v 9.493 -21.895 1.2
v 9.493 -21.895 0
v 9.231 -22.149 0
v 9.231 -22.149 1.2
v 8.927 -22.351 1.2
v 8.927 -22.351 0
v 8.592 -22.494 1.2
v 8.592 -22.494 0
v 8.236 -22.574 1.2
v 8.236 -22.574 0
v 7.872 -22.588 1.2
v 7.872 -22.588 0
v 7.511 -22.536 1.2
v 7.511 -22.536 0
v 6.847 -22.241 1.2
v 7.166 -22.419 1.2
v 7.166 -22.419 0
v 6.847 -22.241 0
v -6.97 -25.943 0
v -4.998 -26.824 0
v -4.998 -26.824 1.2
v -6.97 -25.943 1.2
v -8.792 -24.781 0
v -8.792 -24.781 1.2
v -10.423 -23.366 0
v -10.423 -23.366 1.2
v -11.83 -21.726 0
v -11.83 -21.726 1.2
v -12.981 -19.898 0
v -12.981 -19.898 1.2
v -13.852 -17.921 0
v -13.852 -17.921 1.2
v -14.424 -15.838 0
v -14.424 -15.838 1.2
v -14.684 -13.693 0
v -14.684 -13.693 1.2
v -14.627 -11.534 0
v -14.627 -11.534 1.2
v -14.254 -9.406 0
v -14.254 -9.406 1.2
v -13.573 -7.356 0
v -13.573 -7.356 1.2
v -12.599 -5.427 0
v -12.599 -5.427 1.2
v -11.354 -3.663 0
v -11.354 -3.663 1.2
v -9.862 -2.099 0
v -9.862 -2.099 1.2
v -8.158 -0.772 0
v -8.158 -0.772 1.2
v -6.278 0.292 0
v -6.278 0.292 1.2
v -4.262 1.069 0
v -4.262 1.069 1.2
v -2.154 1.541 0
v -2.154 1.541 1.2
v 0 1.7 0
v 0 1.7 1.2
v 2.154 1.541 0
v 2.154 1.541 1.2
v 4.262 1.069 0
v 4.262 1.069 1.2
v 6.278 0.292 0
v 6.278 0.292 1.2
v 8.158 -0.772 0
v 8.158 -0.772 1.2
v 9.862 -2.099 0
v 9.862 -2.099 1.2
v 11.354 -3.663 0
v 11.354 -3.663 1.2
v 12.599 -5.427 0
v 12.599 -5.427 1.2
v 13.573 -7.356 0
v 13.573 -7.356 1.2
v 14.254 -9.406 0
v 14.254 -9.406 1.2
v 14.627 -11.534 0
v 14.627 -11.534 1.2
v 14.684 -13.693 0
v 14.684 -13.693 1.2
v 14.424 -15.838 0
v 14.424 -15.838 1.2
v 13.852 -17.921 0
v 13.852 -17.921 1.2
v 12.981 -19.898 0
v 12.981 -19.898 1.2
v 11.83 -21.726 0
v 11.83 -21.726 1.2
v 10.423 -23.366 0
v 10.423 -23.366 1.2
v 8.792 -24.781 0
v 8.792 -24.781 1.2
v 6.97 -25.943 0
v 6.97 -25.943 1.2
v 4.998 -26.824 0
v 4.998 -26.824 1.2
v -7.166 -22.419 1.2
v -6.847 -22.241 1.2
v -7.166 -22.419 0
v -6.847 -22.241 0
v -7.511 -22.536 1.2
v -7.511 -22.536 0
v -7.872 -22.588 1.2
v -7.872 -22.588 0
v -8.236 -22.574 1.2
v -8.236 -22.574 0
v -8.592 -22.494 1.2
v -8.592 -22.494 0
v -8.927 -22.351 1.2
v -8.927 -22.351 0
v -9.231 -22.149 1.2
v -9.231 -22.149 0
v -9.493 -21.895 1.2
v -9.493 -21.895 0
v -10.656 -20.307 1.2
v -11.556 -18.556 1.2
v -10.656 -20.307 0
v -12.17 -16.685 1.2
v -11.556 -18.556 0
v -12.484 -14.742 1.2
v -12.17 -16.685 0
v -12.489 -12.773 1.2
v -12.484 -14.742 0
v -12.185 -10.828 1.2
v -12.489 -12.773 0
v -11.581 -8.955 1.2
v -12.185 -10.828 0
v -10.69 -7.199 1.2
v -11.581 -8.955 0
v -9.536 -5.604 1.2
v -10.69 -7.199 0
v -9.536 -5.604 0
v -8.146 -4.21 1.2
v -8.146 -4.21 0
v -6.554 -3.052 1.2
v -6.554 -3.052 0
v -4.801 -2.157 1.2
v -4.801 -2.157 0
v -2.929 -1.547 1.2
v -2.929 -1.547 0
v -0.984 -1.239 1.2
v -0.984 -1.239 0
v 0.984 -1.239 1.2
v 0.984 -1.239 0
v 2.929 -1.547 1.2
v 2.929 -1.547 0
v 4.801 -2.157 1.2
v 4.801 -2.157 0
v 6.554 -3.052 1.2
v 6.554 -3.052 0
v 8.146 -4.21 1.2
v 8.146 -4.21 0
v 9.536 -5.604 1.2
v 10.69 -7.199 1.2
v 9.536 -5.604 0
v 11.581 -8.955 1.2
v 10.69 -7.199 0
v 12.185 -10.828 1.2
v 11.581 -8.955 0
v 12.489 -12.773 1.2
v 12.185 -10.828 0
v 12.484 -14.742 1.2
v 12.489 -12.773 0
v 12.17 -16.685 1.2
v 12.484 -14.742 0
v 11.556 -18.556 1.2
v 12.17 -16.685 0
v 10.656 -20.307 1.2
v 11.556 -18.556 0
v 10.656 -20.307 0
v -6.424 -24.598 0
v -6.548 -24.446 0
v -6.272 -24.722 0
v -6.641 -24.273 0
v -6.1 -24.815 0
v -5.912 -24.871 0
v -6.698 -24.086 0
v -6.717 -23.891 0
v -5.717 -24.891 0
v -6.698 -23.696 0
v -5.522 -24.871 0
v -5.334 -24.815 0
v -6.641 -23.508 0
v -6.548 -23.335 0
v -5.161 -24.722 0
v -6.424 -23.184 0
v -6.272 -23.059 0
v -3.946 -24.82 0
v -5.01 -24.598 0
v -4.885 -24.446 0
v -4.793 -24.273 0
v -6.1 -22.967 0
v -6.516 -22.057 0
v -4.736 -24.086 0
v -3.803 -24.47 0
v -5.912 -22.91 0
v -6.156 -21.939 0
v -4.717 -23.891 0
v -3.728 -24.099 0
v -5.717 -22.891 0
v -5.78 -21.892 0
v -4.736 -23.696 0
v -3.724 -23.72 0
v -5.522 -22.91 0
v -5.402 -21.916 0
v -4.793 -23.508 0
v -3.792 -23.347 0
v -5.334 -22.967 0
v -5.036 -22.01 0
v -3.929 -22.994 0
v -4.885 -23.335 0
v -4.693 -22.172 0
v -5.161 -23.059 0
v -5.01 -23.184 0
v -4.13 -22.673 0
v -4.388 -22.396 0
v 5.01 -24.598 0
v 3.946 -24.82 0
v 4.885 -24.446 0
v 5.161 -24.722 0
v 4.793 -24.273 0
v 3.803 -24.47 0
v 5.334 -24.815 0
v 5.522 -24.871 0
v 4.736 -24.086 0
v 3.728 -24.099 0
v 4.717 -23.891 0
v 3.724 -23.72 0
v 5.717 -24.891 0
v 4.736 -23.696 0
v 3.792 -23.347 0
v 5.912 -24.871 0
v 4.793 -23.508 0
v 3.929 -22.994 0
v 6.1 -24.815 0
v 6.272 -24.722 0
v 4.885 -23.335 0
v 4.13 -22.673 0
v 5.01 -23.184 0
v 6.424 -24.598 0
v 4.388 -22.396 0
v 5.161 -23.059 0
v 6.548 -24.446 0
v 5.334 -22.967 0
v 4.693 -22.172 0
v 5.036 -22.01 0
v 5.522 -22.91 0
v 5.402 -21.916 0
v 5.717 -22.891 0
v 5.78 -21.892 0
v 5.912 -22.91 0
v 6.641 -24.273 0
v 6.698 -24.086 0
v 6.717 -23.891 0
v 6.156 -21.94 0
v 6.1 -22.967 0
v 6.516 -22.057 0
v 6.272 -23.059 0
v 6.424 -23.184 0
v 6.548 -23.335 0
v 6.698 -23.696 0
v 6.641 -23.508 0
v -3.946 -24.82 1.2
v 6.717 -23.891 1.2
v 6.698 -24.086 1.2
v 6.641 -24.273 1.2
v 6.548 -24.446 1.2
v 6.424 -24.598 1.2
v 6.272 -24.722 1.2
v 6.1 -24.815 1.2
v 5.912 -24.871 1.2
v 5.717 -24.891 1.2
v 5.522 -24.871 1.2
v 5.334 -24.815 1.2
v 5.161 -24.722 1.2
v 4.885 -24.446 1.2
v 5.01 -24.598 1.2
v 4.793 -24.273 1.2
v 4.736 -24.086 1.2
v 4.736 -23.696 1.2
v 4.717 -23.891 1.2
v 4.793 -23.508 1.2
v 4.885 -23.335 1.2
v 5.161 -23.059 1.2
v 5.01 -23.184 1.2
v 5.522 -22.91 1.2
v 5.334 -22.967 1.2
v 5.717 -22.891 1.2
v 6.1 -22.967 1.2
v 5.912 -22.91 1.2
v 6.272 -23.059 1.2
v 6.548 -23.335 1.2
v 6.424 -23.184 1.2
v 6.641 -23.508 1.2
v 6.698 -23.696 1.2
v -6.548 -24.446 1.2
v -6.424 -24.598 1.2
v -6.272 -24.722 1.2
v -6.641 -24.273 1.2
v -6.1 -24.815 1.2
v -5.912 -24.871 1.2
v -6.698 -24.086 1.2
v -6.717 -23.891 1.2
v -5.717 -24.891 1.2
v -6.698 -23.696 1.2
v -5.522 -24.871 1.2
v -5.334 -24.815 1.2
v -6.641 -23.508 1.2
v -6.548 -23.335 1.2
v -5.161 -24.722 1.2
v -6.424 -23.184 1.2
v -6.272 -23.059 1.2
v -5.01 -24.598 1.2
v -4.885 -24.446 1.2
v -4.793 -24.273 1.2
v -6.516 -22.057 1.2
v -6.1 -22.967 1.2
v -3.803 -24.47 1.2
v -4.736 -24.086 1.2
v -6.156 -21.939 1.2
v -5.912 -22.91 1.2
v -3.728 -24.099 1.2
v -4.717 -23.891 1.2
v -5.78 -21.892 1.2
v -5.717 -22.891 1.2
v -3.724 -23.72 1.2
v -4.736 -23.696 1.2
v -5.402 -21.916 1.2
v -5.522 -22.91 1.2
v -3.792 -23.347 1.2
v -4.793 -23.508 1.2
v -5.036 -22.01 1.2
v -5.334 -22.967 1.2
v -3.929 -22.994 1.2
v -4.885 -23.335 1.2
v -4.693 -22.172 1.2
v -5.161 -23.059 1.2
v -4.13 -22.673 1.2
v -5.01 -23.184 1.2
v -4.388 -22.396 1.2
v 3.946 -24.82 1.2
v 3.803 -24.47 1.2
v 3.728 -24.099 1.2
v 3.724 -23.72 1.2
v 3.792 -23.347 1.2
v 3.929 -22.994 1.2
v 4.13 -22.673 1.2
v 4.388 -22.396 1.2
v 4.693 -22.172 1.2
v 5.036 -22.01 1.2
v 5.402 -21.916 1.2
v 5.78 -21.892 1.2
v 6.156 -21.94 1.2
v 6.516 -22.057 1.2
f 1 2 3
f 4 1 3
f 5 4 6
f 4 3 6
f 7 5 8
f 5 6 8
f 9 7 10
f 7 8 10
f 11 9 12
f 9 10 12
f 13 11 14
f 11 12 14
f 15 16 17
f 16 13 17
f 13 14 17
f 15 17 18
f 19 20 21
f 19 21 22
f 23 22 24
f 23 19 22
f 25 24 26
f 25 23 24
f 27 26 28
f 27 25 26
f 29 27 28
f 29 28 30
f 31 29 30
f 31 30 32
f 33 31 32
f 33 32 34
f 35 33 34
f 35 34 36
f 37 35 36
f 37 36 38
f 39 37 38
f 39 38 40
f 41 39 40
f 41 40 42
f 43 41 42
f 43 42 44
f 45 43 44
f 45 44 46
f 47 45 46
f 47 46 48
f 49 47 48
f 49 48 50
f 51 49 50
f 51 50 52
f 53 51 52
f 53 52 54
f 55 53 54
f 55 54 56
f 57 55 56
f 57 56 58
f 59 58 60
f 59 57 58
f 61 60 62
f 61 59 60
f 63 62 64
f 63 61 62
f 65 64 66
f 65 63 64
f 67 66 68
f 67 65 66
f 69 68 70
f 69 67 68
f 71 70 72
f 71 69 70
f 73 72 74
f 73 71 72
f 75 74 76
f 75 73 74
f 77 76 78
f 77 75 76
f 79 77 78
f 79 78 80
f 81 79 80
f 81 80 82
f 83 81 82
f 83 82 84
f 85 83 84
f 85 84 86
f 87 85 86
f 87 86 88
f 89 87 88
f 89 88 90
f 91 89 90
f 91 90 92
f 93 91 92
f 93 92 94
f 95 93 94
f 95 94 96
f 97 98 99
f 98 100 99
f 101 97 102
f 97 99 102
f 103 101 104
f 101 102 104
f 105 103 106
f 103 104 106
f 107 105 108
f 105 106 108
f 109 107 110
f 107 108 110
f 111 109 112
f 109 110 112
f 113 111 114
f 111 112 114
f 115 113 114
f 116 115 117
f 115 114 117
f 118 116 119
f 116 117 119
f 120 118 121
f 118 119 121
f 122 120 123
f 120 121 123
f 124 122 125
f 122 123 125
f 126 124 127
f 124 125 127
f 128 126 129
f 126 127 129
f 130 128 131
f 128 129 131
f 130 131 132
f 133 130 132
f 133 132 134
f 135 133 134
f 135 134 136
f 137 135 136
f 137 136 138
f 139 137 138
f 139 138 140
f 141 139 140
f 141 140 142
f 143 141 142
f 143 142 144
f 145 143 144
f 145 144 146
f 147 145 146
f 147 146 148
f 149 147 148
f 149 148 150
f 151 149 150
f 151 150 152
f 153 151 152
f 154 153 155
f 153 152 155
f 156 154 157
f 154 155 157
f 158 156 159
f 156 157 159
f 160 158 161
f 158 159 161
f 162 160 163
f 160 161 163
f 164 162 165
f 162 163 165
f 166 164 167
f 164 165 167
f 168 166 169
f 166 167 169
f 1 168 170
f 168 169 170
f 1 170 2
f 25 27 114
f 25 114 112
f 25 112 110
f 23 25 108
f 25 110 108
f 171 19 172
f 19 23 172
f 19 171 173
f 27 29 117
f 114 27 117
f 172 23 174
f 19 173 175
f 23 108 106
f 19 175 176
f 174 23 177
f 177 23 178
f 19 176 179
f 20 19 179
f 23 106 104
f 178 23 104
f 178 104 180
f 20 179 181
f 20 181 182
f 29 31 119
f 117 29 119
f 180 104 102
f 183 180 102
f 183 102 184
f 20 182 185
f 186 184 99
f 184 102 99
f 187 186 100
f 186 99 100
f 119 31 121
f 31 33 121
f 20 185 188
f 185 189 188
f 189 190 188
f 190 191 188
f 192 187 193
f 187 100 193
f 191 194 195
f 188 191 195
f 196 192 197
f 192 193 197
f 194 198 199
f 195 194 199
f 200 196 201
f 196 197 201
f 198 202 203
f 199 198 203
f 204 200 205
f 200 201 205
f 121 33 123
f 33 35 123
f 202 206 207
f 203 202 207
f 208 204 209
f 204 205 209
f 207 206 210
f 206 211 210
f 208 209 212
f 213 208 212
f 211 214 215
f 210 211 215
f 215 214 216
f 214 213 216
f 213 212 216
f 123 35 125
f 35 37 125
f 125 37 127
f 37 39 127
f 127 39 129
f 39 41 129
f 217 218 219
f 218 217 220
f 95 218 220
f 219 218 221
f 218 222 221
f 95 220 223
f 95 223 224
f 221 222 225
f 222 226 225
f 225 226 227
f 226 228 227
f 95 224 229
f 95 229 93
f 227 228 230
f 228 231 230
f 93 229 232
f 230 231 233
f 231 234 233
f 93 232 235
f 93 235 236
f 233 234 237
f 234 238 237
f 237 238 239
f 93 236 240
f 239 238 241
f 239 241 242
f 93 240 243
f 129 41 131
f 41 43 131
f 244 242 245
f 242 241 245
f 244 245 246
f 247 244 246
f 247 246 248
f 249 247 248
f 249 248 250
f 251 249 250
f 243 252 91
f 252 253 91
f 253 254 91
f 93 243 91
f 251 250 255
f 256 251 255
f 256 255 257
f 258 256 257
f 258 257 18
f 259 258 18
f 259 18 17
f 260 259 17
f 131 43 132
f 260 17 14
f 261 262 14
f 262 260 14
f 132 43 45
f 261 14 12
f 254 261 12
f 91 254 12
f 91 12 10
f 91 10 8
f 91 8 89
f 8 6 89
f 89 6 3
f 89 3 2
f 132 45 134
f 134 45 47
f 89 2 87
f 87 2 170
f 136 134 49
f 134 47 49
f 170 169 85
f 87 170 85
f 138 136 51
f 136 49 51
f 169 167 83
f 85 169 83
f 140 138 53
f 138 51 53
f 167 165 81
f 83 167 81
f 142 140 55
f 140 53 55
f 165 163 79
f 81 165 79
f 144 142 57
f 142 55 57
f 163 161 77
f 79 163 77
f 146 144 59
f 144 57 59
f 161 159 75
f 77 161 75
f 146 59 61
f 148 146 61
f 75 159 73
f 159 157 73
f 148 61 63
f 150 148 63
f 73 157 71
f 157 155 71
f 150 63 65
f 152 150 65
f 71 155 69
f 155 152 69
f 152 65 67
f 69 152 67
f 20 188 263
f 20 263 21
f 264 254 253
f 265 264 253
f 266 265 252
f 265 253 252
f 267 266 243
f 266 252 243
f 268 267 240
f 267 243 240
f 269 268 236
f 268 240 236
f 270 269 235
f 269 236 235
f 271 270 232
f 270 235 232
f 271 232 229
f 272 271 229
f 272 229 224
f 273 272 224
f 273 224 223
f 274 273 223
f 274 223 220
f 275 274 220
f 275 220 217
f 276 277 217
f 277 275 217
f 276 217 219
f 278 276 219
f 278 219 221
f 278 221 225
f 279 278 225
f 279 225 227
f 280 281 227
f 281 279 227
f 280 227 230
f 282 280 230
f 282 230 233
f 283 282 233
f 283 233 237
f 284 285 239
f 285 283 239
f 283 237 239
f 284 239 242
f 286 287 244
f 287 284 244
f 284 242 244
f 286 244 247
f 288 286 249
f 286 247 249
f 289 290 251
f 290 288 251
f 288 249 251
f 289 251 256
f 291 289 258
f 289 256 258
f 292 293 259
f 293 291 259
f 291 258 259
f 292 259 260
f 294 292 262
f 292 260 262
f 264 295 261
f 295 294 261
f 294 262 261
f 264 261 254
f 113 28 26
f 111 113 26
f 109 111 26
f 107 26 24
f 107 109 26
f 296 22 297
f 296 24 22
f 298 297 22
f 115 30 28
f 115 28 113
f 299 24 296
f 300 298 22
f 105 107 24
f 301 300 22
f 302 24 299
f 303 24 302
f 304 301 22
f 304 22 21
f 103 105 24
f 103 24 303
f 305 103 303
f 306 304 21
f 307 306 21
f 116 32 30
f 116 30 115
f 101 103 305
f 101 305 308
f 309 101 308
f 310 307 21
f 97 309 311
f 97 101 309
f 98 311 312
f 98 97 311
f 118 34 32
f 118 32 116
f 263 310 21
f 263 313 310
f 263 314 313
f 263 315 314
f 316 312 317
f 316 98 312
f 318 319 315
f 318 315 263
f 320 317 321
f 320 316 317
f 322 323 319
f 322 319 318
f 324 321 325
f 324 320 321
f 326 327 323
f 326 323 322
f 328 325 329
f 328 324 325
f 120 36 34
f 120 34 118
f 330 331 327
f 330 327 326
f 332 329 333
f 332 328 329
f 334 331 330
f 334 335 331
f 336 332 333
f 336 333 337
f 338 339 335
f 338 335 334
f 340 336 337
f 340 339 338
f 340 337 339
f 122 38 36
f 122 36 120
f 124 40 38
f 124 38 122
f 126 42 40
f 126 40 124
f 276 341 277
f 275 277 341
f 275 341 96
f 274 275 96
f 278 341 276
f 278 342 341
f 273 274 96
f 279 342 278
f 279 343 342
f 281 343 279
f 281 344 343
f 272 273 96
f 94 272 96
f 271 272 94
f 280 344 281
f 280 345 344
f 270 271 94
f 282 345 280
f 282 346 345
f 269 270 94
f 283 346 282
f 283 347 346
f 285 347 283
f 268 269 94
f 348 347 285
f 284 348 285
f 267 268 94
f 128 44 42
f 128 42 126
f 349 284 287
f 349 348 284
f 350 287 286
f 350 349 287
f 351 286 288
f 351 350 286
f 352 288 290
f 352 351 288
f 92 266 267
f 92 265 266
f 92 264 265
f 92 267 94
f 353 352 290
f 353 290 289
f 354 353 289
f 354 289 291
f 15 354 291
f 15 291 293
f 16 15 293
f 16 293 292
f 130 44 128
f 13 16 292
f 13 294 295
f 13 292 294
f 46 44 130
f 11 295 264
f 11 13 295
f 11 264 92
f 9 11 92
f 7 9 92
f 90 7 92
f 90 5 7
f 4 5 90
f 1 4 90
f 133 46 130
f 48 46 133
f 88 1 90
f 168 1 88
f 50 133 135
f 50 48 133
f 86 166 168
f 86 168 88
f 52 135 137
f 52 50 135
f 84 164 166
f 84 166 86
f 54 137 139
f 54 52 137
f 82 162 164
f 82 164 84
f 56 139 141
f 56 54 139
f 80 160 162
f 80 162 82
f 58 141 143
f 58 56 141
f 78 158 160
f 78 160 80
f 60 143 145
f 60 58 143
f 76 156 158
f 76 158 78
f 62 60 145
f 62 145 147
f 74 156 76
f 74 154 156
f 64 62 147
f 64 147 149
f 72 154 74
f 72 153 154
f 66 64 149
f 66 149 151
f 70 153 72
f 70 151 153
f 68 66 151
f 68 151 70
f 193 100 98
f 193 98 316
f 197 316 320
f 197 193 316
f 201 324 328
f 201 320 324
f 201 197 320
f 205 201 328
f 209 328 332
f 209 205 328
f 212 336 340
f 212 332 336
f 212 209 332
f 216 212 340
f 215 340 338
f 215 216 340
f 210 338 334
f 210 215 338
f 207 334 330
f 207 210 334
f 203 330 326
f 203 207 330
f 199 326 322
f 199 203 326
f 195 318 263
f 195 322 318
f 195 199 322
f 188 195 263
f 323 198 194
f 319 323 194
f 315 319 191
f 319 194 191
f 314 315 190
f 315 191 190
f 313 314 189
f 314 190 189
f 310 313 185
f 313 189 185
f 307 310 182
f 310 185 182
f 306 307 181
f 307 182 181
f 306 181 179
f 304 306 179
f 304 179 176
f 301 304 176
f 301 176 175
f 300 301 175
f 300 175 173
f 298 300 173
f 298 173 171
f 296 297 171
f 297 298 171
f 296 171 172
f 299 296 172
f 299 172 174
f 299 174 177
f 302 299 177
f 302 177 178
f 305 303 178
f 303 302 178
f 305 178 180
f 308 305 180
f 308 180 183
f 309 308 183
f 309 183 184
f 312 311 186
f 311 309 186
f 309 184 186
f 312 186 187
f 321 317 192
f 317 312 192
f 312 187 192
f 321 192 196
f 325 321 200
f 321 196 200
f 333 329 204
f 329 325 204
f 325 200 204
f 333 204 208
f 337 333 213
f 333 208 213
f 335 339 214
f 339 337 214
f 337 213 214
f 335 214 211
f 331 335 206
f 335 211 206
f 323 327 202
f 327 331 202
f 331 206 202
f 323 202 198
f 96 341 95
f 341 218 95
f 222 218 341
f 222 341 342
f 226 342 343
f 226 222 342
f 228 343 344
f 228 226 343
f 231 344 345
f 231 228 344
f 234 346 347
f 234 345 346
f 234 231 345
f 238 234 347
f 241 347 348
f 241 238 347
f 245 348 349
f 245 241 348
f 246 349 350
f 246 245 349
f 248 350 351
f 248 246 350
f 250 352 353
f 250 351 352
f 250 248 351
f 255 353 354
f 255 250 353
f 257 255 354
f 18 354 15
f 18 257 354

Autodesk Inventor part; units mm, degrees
ref_plane "YZ Plane" through (0, 0, 0) normal (1, 0, 0) x (0, 1, 0)
ref_plane "XZ Plane" through (0, 0, 0) normal (0, 1, 0) x (-1, 0, 0)
sketch "Szkic1" plane through (0, 0, 0) normal (0, 0, 1) x (1, 0, 0)
  arc A0 (9.4933, -21.8953) -> (-9.4933, -21.8953) centre (0, -13.725) ccw
  line L0 (0, 15.1128) -> (0, -73.1766) projected
  line L1 (-45.5, 0) -> (45.5, 0) projected
  line L2 (-4.9645, 1.7) -> (1.5024, 1.7) construction
  arc A1 (4.998, -26.8243) -> (-4.998, -26.8243) centre (0, -13) ccw
  line L3 (0, -1.2) -> (-5.3069, -1.2) construction
  line L4 (0, -13) -> (-6.8324, -26.0157) construction
  line L5 (-6.8324, -26.0157) -> (-20.0146, -19.0959) construction
  line L6 (-5.7169, -23.8907) -> (-15.9662, -18.5105) construction
  circle A2 centre (-5.7169, -23.8907) radius 1
  arc A3 (-3.946, -24.8203) -> (-6.8471, -22.2407) centre (-5.7169, -23.8907) ccw
  arc A4 (-9.4933, -21.8953) -> (-6.8471, -22.2407) centre (-7.9774, -20.5907) ccw
  line L7 (-3.946, -24.8203) -> (-4.998, -26.8243)
  circle A5 centre (5.7169, -23.8907) radius 1
  arc A6 (6.8471, -22.2407) -> (3.946, -24.8203) centre (5.7169, -23.8907) ccw
  arc A7 (6.8471, -22.2407) -> (9.4933, -21.8953) centre (7.9774, -20.5907) ccw
  line L8 (3.946, -24.8203) -> (4.998, -26.8243)
  point P0 (-13.0867, -20.022)
  point P1 (6.8324, -26.0157)
  dimension "d8" = 0.725
  dimension "d38" = 2.9
  dimension "d39" = 13
  dimension "d43" = 14.7
  dimension "d45" = 2.4
  dimension "d46" = 2
  dimension "d47" = 4.998
  dimension "d48" = 2
  dimension "d49" = 2
extrude "Bryła" add sketch "Szkic1" along normal blind 1.2
ref_plane "Work Plane1" through (0, -13.725, 0) normal (1, 0, 0) x (0, 0, 1)
equation "\"d8\" = 0.25 * SRB1"
equation "\"d38\" = SRB1"
equation "\"d39\" = 0.5 * WD"
equation "\"d43\" = 0.5 * ND"
equation "\"d45\" = 0.5 * SRB2"
equation "\"d46\" = SD5"
equation "\"d47\" = 0.17 * ND"
equation "\"d48\" = SD5"
equation "\"d49\" = SD5"
equation "\"d2\" = SD"
equation "\"WD\" = WDMIN"
equation "\"SD\" = 1.2"
equation "\"SRB1\" = 2.9"
equation "\"ND\" = 29.4"
equation "\"SRB2\" = 4.8"
equation "\"SD5\" = 2"
equation "\"WDMIN\" = 26"
equation "\"SD6\" = 30.1"
equation "\"NND\" = 28"
equation "\"WDMAX\" = NND"
properties part number "DIN 472 - 28 x 1,2" material "Stal, miękka"
